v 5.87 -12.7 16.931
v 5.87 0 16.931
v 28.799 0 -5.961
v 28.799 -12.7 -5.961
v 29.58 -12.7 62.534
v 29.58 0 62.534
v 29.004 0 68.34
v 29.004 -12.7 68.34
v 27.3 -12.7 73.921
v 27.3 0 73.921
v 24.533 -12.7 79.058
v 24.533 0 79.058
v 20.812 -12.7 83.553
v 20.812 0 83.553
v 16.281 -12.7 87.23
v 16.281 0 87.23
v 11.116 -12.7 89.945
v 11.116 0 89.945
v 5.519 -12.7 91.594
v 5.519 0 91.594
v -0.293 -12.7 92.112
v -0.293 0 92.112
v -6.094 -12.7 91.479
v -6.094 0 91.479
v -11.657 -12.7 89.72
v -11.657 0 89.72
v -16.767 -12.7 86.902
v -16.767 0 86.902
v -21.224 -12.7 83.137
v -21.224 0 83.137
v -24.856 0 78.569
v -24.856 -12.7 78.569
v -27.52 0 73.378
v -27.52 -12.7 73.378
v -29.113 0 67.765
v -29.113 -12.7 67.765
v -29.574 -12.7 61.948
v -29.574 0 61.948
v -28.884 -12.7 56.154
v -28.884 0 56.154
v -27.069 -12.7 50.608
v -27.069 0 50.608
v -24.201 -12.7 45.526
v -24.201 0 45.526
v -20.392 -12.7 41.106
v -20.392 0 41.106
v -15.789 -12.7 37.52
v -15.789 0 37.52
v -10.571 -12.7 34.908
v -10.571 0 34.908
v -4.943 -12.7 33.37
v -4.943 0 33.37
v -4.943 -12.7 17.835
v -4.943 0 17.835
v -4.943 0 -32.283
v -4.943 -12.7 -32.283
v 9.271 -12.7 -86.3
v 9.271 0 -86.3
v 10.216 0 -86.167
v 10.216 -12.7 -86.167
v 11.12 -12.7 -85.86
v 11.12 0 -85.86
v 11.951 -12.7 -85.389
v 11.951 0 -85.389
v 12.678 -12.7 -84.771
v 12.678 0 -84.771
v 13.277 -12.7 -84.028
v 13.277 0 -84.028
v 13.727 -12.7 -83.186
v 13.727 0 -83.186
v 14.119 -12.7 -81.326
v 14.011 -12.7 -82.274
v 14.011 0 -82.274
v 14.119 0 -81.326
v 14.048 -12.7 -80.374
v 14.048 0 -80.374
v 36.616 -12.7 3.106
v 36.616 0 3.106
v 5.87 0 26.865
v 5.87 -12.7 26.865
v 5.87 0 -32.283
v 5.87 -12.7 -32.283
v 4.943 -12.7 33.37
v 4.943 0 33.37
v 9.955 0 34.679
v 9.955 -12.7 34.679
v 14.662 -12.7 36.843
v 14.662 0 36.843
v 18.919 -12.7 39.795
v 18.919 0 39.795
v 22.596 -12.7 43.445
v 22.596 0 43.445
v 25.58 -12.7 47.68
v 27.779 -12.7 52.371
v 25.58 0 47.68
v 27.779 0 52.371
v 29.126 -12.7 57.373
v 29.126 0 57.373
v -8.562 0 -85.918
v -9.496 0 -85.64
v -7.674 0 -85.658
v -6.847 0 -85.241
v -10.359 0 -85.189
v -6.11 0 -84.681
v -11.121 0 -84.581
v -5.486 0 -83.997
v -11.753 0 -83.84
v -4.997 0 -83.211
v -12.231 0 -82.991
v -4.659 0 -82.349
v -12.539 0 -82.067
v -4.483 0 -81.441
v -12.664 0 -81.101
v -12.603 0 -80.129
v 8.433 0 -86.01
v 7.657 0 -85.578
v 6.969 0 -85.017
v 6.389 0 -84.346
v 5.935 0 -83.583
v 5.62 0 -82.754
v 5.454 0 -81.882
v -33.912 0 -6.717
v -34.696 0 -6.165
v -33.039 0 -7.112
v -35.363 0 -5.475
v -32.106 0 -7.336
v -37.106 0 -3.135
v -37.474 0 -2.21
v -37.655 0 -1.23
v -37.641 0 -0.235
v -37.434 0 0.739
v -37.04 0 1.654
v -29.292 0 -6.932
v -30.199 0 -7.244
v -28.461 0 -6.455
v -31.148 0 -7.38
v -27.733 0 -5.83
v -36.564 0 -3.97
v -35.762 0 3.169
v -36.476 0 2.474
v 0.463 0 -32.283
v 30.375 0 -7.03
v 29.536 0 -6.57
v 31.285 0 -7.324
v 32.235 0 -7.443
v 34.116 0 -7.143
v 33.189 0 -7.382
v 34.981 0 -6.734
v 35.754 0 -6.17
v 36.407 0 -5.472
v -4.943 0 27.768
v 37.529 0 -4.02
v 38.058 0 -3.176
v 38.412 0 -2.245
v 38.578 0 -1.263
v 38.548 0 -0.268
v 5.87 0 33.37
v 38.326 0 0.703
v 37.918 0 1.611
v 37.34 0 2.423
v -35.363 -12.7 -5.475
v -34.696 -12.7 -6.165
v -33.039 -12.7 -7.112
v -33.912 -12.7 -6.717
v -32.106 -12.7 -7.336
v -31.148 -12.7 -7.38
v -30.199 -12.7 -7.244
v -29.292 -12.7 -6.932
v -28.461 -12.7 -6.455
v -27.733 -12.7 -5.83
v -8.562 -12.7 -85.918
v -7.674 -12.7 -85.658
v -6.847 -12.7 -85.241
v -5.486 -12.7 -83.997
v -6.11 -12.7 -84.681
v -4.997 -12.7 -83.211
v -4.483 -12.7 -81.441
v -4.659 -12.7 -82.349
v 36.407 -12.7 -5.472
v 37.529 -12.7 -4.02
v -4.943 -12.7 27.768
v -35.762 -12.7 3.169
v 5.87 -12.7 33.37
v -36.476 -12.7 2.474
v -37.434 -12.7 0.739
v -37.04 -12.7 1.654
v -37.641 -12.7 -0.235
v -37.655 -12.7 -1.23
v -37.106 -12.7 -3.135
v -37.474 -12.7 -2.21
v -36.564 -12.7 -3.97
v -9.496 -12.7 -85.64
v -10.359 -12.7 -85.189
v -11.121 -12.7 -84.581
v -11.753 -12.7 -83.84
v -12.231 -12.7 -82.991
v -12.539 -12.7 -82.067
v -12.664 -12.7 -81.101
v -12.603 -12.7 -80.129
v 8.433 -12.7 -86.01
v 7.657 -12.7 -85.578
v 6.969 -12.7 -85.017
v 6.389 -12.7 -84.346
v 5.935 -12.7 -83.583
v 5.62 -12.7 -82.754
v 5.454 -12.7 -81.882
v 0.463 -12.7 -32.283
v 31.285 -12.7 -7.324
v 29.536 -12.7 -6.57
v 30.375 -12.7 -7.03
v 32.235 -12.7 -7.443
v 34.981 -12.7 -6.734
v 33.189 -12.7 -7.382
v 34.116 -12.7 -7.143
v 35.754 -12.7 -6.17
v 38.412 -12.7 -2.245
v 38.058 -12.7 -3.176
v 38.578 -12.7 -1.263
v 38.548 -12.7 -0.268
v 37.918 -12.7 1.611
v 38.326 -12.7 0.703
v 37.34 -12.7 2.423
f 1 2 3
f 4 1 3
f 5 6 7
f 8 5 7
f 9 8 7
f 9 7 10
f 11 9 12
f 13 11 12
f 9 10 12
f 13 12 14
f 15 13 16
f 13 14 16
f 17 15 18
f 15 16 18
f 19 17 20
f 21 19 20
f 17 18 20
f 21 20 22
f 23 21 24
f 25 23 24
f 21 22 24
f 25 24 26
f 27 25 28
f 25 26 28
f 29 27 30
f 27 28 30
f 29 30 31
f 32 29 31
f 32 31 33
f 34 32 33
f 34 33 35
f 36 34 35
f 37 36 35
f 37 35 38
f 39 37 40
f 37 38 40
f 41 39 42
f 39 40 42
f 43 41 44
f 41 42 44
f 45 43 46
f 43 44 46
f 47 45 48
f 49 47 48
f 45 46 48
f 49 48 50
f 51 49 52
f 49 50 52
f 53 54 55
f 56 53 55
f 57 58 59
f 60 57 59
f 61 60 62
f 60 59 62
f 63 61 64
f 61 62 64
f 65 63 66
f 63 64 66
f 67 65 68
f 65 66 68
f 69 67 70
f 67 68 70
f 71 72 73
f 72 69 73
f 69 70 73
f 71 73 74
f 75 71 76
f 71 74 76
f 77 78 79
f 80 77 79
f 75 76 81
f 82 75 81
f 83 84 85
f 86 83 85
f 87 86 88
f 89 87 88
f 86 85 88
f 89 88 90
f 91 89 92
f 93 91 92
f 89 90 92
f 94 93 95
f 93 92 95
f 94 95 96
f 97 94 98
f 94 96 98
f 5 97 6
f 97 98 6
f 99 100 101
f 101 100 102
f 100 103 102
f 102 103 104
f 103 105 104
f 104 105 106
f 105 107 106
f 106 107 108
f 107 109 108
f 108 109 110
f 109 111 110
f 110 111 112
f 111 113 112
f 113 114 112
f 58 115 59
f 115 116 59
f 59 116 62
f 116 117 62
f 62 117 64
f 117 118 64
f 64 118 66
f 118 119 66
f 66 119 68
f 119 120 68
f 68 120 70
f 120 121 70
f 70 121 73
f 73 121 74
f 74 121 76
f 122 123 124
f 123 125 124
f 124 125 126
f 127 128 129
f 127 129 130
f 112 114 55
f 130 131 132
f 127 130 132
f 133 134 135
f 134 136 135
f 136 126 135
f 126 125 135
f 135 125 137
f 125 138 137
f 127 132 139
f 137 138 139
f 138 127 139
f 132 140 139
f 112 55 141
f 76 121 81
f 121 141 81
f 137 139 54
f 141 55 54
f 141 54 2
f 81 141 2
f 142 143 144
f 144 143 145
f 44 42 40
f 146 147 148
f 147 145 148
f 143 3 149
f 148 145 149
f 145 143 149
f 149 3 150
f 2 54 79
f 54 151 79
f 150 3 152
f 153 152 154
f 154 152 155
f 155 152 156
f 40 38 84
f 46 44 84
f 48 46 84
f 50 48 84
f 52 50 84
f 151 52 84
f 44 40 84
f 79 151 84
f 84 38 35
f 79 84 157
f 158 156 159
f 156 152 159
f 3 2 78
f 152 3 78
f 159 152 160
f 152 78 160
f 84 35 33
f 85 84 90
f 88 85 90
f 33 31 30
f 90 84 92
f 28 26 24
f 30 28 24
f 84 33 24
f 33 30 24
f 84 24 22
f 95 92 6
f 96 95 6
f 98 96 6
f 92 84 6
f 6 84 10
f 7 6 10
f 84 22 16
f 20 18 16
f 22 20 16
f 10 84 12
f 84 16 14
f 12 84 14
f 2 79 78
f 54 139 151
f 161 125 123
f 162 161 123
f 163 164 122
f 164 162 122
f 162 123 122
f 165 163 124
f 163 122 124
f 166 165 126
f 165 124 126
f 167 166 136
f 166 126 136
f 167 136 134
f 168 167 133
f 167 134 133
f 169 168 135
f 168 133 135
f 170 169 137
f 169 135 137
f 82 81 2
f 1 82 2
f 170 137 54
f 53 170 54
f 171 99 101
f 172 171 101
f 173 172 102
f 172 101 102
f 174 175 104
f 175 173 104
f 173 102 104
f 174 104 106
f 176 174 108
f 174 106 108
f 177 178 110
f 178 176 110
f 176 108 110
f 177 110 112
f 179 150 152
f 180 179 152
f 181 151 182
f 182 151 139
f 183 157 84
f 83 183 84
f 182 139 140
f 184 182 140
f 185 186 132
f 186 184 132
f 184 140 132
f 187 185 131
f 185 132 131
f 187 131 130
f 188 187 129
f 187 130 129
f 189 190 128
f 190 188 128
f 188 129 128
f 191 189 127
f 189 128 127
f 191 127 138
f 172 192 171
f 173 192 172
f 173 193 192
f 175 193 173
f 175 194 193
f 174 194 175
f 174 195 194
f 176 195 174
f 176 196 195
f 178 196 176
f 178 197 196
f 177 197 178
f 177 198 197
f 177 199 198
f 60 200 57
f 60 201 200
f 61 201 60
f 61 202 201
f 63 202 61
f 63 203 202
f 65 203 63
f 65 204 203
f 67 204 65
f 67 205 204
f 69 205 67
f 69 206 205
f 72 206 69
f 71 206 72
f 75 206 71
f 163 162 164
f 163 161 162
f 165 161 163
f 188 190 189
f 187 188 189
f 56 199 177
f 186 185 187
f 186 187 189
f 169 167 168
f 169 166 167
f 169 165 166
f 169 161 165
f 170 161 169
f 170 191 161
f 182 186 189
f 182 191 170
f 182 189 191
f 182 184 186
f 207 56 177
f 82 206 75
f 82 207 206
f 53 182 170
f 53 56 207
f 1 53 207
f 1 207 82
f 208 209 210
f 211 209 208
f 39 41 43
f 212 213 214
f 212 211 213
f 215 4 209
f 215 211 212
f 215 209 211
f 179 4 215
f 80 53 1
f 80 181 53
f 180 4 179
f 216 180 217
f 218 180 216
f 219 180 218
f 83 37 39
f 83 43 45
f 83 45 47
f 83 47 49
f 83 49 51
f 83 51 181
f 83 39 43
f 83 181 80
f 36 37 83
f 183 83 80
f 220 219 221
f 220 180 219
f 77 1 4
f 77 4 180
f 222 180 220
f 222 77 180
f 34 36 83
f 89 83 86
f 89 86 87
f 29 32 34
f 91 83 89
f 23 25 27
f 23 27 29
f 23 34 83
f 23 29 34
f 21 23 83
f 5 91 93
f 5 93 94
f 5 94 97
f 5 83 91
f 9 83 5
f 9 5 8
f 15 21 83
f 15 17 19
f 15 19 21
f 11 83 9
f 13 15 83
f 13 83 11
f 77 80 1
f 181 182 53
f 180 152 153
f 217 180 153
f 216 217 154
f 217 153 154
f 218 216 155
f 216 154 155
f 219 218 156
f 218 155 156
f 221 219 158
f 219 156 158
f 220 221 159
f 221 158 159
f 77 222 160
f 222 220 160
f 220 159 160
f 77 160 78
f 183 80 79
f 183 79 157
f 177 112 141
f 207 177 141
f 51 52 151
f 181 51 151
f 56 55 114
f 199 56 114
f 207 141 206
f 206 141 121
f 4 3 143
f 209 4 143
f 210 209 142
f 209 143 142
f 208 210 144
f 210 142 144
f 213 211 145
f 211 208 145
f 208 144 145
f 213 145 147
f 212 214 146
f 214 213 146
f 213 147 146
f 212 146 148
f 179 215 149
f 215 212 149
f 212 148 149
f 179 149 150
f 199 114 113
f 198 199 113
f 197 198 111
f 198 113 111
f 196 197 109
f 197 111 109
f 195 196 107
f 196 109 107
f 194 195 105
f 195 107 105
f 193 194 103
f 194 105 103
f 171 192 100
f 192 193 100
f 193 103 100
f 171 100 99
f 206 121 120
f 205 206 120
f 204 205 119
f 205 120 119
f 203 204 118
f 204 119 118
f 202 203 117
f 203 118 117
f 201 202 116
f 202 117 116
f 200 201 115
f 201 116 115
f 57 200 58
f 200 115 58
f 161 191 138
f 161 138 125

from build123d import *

# Parameters (mm, degrees)
F1_DEPTH     = 12.7
F2_T1_DEPTH  = 38.1
F2_T3_DEPTH  = 41.6542533238
F2_T5_DEPTH  = 41.5408544992
F2_T7_DEPTH  = 35.6725625774
F2_T9_DEPTH  = 33.4559034625
F2_T11_DEPTH = 42.4902813585
F2_T13_DEPTH = 46.0406969882


# Not quite as in the source:
# - a fillet or chamfer that OpenCascade refuses, or shapes differently, is made with other operations: its cross-section is extruded or revolved along the edge and cut away or added


with BuildPart() as f1:
    # F0 (on Front) → F1 (new body)
    with BuildSketch(Plane.XZ):
        with BuildLine():
            ThreePointArc((4.9426316758, 33.3698169468), (22.5960240749, 43.4449478875), (29.579706142, 62.5336542726))
            ThreePointArc((29.579706142, 62.5336542726), (-19.0887063851, 85.1296783474), (-4.9426316758, 33.3698169468))
            Line((-4.9426316758, 33.3698169468), (4.9426316758, 33.3698169468))
        make_face()
        with BuildLine():
            Line((4.9426316758, 33.3698169468), (-4.9426316758, 33.3698169468))
            ThreePointArc((-4.9426316758, 33.3698169468), (0, 32.9539481306), (4.9426316758, 33.3698169468))
        make_face()
        with BuildLine():
            ThreePointArc((4.9426316758, 33.3698169468), (0, 32.9539481306), (-4.9426316758, 33.3698169468))
            Line((-4.9426316758, 33.3698169468), (-4.9426316758, 27.7676489204))
            Line((-4.9426316758, 27.7676489204), (-4.9426316758, 17.8345050663))
            Line((-4.9426316758, 17.8345050663), (-4.9426316758, -32.282717526))
            Line((-4.9426316758, -32.282717526), (0.4634799664, -32.282717526))
            Line((0.4634799664, -32.282717526), (5.8695916086, -32.282717526))
            Line((5.8695916086, -32.282717526), (5.8695916086, 16.9314928353))
            Line((5.8695916086, 16.9314928353), (5.8695916086, 26.8646366894))
            Line((5.8695916086, 26.8646366894), (5.8695916086, 33.3698169468))
            Line((5.8695916086, 33.3698169468), (4.9426316758, 33.3698169468))
        make_face()
        Polygon((-4.9426316758, 17.8345050663), (-4.9426316758, 27.7676489204), (-39.732567966, 0), (-31.750221352, -10.0010386527), align=None)
        Polygon((40.6355895102, 0), (5.8695916086, 26.8646366894), (5.8695916086, 16.9314928353), (32.8805417262, -10.0359434636), align=None)
        Polygon((0.4634799664, -32.282717526), (-4.9426316758, -32.282717526), (-13.5451909155, -86.0119983554), (-4.9426316758, -86.0119983554), align=None)
        Polygon((5.8695916086, -32.282717526), (0.4634799664, -32.282717526), (5.8695916086, -86.0119983554), (15.1662486102, -86.9474057324), align=None)
    extrude(amount=F1_DEPTH)

    # F2: fillet of radius 5.08 on 8 edges, made by hand

    # F2_s2 → F2_t1 (cut)
    with BuildSketch(Plane.XZ.offset(-12.7)):
        with BuildLine():
            ThreePointArc((37.5294360638, -4.0197276981), (38.5484672449, -0.2675797032), (36.6158618121, 3.1061534464))
            Line((36.6158618121, 3.1061534464), (40.6355895102, 0))
            Line((40.6355895102, 0), (37.5294360638, -4.0197276981))
        make_face()
        with BuildLine():
            ThreePointArc((-35.7621773131, 3.168974292), (-37.641496387, -0.2347294175), (-36.5635936739, -3.9703906529))
            Line((-36.5635936739, -3.9703906529), (-39.732567966, 0))
            Line((-39.732567966, 0), (-35.7621773131, 3.168974292))
        make_face()
    extrude(amount=F2_T1_DEPTH, mode=Mode.SUBTRACT)

    # F2_s4 → F2_t3 (cut)
    with BuildSketch(Plane.XZ.offset(-14.4771266619)):
        with BuildLine():
            ThreePointArc((-35.3626341248, -5.4750663394), (-31.6283156718, -7.3806038383), (-27.7332133062, -5.8299958835))
            Line((-27.7332133062, -5.8299958835), (-31.750221352, -10.0010386527))
            Line((-31.750221352, -10.0010386527), (-35.3626341248, -5.4750663394))
        make_face()
    extrude(amount=F2_T3_DEPTH, mode=Mode.SUBTRACT)

    # F2_s6 → F2_t5 (cut)
    with BuildSketch(Plane.XZ.offset(-14.4204272496)):
        with BuildLine():
            ThreePointArc((28.7985423047, -5.960520019), (32.7134460909, -7.4350713917), (36.4074755687, -5.4716764688))
            Line((36.4074755687, -5.4716764688), (32.8805417262, -10.0359434636))
            Line((32.8805417262, -10.0359434636), (28.7985423047, -5.960520019))
        make_face()
    extrude(amount=F2_T5_DEPTH, mode=Mode.SUBTRACT)

    # F2_s8 → F2_t7 (cut)
    with BuildSketch(Plane.XZ.offset(-11.4862812887)):
        with BuildLine():
            ThreePointArc((-9.5371441912, -86.0119983554), (-6.1295888664, -84.699619184), (-4.4826652871, -81.4405679254))
            Line((-4.4826652871, -81.4405679254), (-4.9426316758, -86.0119983554))
            Line((-4.9426316758, -86.0119983554), (-9.5371441912, -86.0119983554))
        make_face()
    extrude(amount=F2_T7_DEPTH, mode=Mode.SUBTRACT)

    # F2_s10 → F2_t9 (cut)
    with BuildSketch(Plane.XZ.offset(-10.3779517312)):
        with BuildLine():
            ThreePointArc((5.4540081087, -81.8816725212), (6.9163845644, -84.9652053996), (9.9999174428, -86.4275818554))
            Line((9.9999174428, -86.4275818554), (5.8695916086, -86.0119983554))
            Line((5.8695916086, -86.0119983554), (5.4540081087, -81.8816725212))
        make_face()
    extrude(amount=F2_T9_DEPTH, mode=Mode.SUBTRACT)

    # F2_s12 → F2_t11 (cut)
    with BuildSketch(Plane.XZ.offset(-14.8951406792)):
        with BuildLine():
            ThreePointArc((-12.6032474685, -80.1288718839), (-11.452770586, -84.2279441623), (-7.5871346438, -86.0119983554))
            Line((-7.5871346438, -86.0119983554), (-13.5451909155, -86.0119983554))
            Line((-13.5451909155, -86.0119983554), (-12.6032474685, -80.1288718839))
        make_face()
    extrude(amount=F2_T11_DEPTH, mode=Mode.SUBTRACT)

    # F2_s14 → F2_t13 (cut)
    with BuildSketch(Plane.XZ.offset(-16.6703484941)):
        with BuildLine():
            ThreePointArc((8.5316088631, -86.2798441603), (12.7526164419, -84.6929586624), (14.0482707219, -80.3736542564))
            Line((14.0482707219, -80.3736542564), (15.1662486102, -86.9474057324))
            Line((15.1662486102, -86.9474057324), (8.5316088631, -86.2798441603))
        make_face()
    extrude(amount=F2_T13_DEPTH, mode=Mode.SUBTRACT)


solid = f1.part
